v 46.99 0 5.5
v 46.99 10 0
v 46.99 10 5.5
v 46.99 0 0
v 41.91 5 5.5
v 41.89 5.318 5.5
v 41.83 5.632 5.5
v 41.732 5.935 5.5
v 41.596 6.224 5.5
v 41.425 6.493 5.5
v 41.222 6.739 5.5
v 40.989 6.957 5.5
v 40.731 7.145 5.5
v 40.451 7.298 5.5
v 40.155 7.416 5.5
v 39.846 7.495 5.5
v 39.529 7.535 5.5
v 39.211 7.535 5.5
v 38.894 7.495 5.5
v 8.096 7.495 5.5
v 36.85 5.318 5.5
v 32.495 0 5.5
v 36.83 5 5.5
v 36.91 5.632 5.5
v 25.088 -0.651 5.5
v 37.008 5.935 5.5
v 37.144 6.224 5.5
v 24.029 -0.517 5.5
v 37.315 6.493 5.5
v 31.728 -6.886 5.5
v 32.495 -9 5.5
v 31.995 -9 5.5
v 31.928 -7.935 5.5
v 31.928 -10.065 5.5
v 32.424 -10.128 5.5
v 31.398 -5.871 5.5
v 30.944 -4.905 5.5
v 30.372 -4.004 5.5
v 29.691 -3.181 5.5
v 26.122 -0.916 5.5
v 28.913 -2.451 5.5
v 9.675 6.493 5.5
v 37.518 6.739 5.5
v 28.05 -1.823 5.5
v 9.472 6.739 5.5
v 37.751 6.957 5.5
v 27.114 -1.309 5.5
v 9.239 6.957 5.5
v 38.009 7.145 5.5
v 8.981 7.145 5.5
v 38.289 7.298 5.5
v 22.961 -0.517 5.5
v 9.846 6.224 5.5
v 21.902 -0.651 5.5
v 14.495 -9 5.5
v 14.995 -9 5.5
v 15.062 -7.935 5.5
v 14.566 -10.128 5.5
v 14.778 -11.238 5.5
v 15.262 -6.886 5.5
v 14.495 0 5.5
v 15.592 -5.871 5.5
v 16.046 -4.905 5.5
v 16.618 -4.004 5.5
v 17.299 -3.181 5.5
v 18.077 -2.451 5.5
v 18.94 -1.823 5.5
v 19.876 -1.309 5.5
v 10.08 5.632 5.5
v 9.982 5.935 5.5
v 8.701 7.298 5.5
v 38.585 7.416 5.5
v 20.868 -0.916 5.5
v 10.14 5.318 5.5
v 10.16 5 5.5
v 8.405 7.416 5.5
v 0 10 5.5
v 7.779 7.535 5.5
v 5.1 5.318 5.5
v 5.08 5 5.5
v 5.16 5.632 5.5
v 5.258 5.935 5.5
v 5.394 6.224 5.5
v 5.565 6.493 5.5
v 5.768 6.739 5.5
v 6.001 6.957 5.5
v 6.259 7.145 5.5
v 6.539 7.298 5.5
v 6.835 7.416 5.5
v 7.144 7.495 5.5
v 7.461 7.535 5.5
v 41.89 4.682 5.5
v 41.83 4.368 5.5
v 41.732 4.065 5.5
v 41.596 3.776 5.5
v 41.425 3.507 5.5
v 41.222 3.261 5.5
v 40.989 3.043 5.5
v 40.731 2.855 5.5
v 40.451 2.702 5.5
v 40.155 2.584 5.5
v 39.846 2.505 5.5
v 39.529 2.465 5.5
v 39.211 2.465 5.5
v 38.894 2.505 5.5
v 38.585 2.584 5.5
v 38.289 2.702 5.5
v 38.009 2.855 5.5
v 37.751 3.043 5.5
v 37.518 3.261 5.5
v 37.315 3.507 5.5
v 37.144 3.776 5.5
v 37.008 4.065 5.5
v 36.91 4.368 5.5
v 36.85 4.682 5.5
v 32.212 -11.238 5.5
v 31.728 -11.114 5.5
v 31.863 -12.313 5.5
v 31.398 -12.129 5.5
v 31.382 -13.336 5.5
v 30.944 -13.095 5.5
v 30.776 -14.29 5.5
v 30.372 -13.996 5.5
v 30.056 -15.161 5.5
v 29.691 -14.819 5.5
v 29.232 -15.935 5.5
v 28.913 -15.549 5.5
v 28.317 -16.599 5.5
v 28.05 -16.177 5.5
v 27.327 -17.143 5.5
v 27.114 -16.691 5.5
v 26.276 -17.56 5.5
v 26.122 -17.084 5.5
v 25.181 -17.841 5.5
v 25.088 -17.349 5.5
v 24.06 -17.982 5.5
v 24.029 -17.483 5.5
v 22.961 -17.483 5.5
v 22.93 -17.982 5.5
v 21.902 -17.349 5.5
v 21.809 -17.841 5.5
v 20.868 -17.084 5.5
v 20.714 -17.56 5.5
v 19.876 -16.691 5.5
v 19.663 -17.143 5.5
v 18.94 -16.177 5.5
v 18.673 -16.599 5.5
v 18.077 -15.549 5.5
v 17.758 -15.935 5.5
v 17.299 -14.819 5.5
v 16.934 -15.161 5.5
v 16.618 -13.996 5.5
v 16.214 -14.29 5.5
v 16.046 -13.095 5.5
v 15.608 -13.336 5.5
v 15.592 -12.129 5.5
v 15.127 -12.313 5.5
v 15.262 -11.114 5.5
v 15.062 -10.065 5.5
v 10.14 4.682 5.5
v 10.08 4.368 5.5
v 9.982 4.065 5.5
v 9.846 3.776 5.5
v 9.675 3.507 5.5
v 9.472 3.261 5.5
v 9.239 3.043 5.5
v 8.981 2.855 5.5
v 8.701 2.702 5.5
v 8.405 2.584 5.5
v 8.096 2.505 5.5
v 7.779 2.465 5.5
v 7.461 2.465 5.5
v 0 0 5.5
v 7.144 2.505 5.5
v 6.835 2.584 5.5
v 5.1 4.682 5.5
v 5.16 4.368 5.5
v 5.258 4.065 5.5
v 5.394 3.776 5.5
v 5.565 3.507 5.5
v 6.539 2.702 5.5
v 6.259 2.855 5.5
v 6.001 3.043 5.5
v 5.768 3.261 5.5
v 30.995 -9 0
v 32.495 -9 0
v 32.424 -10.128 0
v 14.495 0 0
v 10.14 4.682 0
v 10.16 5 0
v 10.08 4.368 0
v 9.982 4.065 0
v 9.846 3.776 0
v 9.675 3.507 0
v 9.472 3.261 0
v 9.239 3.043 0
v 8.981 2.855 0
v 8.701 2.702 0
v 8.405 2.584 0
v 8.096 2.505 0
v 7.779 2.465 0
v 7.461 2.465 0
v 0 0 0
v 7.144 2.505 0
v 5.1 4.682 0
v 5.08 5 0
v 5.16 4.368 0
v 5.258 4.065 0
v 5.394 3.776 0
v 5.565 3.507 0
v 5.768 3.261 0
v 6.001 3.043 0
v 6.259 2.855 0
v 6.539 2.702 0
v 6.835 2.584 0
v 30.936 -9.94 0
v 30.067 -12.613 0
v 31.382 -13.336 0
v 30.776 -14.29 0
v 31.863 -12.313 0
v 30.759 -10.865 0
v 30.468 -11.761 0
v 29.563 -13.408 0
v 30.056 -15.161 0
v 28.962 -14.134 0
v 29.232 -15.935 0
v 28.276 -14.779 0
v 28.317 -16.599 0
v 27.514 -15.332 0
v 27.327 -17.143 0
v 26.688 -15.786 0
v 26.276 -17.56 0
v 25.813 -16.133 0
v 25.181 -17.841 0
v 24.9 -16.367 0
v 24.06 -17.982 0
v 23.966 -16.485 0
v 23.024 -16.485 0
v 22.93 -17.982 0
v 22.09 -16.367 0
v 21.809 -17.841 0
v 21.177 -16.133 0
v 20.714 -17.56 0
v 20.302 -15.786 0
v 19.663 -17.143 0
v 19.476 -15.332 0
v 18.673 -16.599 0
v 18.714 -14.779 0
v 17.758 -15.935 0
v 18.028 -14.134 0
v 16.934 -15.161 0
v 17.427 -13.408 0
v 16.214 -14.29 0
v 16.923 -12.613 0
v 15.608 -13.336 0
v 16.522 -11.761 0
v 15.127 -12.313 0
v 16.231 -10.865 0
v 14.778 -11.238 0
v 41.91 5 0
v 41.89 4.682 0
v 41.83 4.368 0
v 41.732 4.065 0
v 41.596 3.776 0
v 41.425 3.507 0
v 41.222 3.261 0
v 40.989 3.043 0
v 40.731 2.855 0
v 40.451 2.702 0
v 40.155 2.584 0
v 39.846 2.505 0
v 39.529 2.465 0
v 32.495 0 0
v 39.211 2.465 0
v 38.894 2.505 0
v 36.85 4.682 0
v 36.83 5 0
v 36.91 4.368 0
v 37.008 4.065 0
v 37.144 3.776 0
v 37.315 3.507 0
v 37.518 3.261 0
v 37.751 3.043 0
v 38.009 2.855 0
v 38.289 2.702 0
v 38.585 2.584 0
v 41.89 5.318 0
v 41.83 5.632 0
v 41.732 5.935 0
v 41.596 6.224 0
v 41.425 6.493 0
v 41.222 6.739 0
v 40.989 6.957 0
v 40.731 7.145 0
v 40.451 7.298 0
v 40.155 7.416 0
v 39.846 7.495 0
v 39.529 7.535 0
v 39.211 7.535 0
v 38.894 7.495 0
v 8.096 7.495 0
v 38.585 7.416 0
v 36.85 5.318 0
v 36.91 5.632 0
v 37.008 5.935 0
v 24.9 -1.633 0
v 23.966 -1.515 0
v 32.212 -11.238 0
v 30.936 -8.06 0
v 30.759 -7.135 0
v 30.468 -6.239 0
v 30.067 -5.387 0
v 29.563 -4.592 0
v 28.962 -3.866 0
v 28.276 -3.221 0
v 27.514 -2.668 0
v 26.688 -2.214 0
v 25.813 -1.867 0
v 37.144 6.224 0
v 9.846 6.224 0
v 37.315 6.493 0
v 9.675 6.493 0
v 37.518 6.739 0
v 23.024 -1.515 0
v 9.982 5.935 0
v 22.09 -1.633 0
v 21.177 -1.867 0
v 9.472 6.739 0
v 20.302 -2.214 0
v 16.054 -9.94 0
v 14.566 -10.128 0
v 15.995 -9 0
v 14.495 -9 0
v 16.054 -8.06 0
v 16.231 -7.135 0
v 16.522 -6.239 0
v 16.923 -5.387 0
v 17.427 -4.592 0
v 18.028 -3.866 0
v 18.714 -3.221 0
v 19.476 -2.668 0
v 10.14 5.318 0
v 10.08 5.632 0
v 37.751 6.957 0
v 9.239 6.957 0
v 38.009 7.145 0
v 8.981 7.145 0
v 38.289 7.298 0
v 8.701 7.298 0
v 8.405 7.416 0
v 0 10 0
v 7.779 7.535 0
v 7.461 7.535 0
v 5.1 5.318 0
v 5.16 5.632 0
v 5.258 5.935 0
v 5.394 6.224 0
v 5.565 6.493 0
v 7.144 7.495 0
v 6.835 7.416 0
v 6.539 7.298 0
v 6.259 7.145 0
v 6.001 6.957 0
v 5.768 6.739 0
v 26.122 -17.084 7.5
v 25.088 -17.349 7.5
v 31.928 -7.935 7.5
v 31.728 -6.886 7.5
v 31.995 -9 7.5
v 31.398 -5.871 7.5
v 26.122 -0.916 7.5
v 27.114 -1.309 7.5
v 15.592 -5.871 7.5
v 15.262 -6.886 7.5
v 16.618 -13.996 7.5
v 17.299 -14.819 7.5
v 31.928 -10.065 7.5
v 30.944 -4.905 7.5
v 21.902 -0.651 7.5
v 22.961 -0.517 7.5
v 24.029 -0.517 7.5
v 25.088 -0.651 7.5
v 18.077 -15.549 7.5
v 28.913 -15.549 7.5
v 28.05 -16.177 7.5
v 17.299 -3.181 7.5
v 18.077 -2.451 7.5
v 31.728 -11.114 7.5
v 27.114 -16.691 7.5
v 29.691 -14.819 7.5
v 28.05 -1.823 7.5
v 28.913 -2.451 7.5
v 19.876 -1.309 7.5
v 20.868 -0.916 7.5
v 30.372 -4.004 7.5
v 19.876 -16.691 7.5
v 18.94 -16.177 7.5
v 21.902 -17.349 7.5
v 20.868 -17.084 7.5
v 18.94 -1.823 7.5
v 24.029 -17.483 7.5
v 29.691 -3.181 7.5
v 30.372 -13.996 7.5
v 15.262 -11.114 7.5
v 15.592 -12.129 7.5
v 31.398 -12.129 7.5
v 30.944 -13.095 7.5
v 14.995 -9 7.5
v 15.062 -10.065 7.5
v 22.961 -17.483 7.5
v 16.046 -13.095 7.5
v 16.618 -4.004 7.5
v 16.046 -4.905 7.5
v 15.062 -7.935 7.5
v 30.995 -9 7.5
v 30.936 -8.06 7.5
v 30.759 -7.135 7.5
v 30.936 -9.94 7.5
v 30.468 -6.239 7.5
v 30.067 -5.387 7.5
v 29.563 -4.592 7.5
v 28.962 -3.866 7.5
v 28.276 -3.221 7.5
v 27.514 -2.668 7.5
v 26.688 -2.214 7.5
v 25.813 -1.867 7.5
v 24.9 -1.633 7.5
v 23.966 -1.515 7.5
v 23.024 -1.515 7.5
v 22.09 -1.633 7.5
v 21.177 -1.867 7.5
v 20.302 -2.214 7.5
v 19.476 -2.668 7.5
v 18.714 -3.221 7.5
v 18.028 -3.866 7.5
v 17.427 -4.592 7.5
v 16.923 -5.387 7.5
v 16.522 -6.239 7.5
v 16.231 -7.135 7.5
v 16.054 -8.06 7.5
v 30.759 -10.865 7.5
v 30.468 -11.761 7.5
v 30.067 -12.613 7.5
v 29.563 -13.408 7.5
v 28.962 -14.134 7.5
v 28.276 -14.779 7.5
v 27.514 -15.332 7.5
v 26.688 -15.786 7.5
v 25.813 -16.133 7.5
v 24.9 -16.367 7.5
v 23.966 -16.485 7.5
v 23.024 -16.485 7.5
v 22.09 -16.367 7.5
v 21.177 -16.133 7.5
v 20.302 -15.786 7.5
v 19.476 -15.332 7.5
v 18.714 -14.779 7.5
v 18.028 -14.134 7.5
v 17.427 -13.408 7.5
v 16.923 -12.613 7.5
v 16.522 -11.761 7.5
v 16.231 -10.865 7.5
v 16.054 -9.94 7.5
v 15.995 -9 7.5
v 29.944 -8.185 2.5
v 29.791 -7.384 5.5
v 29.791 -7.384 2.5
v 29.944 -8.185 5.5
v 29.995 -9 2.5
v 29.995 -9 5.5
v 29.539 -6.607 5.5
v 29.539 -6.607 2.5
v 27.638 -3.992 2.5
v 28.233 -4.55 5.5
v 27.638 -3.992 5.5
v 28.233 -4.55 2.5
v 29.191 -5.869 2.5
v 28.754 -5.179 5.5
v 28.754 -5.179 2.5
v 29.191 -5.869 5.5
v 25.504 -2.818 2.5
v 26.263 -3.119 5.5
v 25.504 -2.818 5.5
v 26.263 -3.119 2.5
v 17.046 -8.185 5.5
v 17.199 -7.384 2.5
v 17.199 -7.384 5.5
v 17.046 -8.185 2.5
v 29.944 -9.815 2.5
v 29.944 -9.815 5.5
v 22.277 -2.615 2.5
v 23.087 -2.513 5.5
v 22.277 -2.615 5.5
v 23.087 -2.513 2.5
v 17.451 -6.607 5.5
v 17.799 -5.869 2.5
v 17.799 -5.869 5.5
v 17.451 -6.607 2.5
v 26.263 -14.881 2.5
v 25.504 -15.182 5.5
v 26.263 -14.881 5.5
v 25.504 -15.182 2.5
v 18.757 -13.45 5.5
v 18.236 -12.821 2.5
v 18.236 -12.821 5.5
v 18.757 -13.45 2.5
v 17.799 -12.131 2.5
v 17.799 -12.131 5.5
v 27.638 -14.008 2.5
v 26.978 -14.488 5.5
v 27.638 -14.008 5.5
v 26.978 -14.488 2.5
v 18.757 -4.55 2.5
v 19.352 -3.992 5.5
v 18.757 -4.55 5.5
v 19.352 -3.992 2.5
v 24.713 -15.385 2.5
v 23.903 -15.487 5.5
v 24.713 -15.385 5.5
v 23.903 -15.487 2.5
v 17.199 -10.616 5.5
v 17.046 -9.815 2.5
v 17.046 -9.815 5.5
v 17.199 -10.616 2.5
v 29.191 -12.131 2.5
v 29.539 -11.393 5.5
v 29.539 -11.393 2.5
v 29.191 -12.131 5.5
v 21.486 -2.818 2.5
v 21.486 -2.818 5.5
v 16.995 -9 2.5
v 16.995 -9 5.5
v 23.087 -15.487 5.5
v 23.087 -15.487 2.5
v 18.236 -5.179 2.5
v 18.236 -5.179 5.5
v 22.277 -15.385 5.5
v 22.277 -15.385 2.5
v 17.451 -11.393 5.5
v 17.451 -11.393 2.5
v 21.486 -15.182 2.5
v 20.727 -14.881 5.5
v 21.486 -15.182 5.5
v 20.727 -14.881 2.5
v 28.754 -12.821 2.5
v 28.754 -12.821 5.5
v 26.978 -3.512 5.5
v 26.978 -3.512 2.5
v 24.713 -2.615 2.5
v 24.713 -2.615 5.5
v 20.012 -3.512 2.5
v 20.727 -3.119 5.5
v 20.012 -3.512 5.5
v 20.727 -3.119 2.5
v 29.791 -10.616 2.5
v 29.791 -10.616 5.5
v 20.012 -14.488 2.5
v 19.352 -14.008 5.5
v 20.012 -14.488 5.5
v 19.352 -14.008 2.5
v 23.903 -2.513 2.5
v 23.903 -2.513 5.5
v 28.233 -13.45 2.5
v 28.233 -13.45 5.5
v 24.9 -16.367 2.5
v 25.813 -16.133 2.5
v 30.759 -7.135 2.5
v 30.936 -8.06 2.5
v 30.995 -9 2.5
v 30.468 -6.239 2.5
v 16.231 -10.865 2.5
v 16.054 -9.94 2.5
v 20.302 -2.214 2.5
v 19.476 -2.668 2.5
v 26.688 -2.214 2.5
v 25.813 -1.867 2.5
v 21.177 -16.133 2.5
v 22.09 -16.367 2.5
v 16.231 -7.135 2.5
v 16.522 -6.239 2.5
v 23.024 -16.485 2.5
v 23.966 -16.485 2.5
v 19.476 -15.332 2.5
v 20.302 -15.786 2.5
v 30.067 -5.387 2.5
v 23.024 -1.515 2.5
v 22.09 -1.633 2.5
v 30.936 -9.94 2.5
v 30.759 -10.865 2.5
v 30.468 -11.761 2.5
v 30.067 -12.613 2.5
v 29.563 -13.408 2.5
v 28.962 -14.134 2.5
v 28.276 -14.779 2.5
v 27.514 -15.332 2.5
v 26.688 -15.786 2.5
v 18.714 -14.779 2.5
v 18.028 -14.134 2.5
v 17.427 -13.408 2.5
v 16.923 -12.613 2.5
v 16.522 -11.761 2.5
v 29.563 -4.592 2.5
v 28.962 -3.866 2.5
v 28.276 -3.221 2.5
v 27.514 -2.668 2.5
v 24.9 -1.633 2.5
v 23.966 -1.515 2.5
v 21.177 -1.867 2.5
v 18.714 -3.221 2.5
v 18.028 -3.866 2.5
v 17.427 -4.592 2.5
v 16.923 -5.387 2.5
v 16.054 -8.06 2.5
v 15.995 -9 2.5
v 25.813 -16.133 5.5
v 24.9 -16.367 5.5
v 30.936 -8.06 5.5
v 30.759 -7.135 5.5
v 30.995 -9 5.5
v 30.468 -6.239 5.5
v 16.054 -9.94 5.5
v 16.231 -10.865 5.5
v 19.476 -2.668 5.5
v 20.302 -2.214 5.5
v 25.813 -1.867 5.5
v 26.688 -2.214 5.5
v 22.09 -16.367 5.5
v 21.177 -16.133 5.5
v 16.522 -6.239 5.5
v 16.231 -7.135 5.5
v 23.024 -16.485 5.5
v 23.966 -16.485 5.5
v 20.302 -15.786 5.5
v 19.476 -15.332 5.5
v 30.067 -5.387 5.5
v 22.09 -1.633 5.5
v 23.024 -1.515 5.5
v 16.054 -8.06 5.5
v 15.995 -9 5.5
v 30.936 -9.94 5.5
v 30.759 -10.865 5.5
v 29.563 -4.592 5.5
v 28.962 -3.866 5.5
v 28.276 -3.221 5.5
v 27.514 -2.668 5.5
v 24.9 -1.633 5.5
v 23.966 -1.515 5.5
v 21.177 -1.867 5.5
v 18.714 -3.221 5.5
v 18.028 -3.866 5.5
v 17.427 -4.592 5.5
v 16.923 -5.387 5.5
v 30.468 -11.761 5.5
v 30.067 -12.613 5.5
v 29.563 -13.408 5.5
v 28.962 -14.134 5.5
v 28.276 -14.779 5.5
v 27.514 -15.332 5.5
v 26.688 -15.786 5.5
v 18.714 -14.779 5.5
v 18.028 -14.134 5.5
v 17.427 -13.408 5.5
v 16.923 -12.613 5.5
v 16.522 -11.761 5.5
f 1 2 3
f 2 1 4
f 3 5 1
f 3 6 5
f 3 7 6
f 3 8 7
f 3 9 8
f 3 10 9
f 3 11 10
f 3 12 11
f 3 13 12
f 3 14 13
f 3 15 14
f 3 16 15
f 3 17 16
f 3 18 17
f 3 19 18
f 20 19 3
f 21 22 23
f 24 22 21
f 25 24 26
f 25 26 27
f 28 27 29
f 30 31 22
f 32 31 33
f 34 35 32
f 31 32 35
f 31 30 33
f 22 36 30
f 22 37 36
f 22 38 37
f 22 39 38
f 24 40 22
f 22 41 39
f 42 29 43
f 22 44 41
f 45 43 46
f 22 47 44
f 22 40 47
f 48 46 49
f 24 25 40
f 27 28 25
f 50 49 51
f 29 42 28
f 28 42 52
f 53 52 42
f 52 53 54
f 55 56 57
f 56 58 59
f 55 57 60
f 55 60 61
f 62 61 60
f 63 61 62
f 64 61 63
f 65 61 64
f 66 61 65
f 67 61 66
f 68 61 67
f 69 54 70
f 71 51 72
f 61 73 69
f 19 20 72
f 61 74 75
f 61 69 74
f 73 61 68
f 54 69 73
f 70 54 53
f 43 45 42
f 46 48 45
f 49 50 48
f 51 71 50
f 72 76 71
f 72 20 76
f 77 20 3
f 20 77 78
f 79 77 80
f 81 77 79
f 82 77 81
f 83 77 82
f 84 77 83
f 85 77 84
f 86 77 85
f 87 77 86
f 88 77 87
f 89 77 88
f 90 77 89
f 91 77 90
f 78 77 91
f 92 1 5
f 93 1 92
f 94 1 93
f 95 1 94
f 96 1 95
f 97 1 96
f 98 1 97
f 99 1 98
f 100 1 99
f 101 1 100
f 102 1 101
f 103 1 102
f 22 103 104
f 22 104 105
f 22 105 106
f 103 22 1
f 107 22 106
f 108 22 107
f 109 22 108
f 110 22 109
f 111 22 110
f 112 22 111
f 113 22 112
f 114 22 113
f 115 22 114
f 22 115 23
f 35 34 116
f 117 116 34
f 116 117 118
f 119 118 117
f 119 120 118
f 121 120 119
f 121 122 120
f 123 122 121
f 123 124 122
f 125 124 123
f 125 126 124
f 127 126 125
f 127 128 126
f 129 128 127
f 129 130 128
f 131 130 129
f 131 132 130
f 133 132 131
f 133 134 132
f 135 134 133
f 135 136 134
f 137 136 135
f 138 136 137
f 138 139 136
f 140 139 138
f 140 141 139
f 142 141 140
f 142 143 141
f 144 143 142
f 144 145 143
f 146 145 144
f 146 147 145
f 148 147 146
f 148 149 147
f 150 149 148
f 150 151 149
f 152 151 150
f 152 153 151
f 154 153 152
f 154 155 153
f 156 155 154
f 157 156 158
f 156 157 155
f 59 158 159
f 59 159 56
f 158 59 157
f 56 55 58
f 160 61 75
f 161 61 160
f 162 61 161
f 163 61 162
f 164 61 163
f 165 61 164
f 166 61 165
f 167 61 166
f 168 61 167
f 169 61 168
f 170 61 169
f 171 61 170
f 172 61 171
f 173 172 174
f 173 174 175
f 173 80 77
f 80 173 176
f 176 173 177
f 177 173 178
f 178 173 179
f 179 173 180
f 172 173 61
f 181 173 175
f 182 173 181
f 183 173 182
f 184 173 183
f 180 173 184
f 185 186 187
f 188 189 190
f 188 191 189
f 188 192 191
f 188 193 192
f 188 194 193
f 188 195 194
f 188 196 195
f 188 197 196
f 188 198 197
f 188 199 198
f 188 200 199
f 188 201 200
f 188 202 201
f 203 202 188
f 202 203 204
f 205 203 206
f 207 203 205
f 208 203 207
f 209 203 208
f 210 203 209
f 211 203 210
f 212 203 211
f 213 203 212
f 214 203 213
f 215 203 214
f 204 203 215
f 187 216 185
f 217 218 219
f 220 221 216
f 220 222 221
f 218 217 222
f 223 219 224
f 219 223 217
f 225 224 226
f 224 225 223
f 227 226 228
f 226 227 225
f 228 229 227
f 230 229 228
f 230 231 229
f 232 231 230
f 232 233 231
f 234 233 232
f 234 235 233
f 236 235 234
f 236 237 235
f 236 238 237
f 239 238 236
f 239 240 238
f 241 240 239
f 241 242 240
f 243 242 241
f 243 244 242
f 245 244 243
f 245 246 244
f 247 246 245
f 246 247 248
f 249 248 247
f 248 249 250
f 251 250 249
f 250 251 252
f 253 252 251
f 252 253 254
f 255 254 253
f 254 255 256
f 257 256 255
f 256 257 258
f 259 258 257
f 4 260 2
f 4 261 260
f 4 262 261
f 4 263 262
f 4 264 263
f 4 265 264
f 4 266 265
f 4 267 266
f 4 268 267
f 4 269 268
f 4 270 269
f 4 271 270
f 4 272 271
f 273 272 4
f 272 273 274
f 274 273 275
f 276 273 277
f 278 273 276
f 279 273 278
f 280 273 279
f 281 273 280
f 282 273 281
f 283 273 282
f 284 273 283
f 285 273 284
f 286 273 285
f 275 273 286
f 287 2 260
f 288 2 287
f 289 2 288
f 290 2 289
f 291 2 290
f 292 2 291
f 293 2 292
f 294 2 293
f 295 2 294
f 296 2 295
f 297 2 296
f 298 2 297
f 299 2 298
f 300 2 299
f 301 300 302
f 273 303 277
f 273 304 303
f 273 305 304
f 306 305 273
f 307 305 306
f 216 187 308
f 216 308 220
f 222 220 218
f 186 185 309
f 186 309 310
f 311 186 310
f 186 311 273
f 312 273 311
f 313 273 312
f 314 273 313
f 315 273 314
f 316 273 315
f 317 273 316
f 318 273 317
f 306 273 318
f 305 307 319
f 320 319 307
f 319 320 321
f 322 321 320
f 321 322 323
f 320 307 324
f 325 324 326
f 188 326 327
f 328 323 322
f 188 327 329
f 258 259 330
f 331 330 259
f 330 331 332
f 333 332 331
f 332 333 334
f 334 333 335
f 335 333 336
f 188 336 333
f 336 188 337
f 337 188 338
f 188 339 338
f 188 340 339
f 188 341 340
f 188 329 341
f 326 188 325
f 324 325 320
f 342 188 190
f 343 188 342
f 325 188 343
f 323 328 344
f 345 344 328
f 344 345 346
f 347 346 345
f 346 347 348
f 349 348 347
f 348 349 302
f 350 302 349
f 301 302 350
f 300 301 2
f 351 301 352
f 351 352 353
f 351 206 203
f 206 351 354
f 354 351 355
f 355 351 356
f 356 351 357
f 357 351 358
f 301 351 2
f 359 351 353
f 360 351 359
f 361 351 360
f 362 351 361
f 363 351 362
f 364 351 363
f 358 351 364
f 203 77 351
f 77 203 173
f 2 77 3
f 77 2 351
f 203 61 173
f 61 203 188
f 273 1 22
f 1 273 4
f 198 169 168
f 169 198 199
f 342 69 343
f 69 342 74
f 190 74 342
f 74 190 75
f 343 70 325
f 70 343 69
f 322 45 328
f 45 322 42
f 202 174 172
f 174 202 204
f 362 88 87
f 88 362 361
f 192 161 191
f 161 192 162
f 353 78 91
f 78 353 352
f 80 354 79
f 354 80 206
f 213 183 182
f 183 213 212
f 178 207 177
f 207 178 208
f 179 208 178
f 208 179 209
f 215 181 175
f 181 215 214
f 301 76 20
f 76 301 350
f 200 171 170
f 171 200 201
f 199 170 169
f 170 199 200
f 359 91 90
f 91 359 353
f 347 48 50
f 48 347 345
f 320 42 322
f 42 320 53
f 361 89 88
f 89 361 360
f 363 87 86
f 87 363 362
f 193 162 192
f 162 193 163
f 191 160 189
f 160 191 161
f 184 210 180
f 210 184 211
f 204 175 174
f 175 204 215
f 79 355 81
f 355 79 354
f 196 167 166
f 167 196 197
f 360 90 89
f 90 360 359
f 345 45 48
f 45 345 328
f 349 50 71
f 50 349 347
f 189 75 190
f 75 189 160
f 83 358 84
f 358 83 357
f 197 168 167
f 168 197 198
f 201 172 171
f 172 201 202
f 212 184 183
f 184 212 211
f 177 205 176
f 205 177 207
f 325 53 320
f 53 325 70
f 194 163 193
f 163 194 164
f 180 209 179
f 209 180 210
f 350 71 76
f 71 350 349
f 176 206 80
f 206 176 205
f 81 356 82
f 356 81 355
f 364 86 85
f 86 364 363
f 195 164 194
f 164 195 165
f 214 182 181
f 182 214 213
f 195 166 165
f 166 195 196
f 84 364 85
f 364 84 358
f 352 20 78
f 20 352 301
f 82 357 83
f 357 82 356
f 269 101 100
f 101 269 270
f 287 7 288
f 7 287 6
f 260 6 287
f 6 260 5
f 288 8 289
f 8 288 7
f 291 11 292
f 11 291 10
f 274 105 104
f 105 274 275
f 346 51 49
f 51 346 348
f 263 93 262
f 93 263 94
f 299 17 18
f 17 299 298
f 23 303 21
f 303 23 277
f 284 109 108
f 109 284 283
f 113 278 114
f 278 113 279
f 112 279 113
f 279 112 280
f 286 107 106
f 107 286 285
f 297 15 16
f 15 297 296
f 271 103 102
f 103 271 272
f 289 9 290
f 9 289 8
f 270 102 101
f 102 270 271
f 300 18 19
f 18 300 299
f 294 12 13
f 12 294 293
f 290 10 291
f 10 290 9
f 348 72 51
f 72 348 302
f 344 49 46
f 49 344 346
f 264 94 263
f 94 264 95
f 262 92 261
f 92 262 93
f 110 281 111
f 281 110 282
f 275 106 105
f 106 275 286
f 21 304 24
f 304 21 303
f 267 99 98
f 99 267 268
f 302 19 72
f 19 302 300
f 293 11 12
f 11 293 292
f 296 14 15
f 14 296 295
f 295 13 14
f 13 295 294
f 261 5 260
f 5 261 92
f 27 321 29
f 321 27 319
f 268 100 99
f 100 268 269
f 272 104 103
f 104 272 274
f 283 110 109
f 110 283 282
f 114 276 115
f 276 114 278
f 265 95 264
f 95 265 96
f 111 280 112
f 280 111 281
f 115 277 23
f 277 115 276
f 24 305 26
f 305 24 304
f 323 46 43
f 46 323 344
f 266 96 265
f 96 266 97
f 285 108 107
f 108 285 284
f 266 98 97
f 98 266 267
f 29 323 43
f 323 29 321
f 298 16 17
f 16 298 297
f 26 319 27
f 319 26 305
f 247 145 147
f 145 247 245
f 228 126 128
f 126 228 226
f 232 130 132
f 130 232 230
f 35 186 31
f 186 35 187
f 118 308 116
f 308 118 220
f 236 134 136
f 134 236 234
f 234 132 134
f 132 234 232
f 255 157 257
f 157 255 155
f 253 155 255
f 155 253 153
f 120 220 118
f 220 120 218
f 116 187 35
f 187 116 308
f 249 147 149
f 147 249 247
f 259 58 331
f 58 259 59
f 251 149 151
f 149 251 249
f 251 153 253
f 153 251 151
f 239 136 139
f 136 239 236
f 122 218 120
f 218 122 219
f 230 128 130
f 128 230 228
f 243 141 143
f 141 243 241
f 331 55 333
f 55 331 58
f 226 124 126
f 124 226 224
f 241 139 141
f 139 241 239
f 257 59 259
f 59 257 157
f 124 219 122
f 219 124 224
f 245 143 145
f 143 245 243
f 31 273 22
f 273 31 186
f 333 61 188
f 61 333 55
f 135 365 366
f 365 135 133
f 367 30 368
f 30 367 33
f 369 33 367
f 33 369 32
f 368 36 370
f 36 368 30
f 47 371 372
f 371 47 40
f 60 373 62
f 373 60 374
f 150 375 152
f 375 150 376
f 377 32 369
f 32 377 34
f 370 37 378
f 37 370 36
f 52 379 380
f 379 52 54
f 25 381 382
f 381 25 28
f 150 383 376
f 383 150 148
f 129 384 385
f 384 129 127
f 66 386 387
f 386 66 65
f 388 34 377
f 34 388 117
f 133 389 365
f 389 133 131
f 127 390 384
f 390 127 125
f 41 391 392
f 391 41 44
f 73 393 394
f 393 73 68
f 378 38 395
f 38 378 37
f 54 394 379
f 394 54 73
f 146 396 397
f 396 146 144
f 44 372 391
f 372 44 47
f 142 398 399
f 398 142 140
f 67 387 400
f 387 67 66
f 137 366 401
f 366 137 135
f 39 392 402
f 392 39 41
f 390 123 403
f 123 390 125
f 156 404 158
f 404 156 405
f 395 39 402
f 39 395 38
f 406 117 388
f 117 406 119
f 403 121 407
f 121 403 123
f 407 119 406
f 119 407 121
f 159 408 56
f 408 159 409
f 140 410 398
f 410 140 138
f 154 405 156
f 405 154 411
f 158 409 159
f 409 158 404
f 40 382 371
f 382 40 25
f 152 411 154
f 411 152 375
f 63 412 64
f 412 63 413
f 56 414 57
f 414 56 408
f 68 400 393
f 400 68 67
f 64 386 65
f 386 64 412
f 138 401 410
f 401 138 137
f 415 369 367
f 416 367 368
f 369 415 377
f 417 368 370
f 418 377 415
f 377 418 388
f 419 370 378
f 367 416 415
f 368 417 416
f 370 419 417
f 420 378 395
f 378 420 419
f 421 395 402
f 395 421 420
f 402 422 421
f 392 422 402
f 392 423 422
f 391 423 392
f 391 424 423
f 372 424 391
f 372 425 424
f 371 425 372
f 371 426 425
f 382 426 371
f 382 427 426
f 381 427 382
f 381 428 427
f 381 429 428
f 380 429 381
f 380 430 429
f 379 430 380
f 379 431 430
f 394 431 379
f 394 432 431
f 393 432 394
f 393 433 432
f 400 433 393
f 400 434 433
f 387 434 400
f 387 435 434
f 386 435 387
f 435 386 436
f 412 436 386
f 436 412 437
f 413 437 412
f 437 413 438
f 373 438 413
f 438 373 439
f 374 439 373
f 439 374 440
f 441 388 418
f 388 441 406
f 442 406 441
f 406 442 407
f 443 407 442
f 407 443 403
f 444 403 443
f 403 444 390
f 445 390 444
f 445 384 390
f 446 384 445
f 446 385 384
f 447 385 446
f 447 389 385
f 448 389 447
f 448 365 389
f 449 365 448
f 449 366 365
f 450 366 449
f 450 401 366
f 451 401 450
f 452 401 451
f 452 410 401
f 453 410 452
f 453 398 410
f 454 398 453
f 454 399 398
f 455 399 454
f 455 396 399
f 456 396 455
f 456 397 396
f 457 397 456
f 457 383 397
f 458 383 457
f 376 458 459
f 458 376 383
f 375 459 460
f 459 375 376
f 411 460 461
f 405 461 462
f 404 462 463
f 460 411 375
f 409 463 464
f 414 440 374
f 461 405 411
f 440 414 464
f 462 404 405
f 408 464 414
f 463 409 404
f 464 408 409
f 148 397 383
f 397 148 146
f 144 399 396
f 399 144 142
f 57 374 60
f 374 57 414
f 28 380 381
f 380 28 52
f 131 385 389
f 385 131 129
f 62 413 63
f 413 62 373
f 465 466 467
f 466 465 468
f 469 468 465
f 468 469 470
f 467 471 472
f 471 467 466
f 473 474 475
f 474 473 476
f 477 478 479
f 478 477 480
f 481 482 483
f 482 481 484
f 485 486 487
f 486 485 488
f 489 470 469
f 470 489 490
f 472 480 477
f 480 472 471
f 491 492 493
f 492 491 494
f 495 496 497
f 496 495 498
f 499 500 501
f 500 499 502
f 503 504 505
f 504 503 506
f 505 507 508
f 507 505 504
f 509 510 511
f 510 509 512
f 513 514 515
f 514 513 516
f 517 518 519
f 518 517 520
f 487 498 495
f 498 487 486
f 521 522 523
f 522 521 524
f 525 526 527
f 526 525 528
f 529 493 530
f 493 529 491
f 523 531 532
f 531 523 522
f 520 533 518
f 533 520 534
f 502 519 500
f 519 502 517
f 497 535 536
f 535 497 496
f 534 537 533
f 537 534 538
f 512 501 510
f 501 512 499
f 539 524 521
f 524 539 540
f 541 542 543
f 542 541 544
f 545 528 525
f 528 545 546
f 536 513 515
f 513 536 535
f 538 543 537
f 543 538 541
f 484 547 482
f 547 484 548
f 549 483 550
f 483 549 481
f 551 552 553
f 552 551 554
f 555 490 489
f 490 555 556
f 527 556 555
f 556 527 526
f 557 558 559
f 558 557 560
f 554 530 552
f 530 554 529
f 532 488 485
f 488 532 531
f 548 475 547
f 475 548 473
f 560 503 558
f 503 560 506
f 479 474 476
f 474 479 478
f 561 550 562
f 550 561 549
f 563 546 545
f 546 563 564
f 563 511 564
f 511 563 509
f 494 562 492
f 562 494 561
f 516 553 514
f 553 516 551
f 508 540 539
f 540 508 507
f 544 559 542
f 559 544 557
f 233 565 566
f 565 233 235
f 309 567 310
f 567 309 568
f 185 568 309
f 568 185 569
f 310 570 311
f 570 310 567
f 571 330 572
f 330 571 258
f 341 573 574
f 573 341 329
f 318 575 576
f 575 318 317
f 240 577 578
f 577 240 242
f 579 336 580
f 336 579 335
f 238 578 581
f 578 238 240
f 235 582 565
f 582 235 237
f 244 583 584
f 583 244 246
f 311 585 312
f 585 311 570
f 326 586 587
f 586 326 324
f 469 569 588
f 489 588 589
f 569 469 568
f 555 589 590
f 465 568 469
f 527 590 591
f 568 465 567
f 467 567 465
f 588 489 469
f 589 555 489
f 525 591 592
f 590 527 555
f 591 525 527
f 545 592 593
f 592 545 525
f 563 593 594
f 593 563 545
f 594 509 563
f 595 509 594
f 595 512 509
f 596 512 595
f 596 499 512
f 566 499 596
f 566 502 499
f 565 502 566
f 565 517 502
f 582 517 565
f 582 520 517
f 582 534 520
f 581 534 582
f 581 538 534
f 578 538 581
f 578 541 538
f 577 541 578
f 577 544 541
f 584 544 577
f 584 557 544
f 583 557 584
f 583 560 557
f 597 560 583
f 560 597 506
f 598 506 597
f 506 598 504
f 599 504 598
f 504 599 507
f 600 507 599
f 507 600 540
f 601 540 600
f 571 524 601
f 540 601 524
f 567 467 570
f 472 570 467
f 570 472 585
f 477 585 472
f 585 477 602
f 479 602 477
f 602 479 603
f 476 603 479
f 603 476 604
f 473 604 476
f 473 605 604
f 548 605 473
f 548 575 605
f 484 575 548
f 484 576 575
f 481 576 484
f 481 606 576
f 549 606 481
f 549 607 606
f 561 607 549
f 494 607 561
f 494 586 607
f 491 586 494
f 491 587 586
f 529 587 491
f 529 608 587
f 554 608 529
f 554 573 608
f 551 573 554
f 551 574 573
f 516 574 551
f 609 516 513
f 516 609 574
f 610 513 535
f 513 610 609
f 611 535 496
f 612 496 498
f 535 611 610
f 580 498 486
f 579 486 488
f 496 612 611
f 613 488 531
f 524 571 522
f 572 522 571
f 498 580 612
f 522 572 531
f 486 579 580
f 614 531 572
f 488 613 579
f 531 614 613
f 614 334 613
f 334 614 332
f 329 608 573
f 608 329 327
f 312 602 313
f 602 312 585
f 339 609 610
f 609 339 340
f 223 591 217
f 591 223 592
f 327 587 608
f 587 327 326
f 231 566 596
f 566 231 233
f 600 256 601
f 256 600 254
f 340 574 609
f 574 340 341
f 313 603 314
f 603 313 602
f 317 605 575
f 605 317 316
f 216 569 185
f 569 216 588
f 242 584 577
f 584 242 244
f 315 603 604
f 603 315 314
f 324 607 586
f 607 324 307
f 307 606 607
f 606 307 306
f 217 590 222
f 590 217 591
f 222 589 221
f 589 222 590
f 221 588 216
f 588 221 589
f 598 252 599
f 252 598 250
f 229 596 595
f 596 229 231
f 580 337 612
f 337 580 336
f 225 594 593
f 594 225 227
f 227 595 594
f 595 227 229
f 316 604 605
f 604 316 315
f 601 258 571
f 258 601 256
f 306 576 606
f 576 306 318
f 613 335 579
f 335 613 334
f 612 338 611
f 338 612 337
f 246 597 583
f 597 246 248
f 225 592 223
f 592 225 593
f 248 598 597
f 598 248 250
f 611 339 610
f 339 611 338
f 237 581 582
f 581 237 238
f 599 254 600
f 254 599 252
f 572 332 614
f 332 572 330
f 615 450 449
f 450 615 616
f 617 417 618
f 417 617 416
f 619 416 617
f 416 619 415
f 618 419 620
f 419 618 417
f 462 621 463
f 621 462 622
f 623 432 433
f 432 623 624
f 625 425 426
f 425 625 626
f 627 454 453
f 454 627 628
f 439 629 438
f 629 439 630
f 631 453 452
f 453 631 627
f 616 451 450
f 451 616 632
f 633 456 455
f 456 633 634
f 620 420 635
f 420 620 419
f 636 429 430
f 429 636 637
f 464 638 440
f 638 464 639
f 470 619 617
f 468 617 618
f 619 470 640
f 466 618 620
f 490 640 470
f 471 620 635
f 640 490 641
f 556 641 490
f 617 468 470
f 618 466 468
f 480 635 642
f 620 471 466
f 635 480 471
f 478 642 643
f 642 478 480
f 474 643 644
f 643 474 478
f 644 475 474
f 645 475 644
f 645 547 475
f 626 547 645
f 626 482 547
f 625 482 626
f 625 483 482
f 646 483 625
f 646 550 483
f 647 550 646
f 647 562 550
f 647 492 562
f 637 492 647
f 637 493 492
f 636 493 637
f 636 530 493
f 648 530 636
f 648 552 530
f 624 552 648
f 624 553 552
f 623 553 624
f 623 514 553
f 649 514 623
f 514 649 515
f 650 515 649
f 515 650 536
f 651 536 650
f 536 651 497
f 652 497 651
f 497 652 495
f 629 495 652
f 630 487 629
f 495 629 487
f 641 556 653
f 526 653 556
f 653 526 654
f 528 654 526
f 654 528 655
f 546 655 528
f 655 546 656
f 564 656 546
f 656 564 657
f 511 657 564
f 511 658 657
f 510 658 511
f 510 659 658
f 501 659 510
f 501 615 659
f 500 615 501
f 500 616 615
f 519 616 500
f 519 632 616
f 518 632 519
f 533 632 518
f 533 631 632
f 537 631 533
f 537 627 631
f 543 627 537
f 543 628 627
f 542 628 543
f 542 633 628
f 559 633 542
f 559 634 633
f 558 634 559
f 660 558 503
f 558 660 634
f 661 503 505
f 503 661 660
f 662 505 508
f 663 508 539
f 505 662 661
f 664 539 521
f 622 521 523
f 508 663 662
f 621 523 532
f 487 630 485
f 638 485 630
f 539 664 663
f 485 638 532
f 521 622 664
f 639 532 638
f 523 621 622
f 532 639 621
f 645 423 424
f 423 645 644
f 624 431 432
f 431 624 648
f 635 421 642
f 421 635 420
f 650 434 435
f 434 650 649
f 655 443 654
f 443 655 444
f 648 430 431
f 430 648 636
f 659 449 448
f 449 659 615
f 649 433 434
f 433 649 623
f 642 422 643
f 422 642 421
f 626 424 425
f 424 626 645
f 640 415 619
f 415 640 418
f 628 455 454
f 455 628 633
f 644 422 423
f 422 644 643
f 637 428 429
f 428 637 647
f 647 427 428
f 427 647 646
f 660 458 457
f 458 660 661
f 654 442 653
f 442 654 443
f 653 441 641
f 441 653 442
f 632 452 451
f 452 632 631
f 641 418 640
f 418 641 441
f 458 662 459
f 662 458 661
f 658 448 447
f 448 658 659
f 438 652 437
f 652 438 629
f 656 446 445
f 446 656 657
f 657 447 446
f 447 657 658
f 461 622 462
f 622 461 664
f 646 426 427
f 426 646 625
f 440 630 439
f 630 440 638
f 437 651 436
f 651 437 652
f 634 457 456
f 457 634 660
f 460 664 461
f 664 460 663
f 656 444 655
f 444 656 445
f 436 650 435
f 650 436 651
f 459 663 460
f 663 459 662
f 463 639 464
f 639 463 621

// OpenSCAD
$fn=50;

module lampmount(width, thick) {
  hole=13;
  baset=2.5;
  clear=3;
//  thick=baset+clear;
  difference(){
    union(){
      translate([0,0,0]) cylinder(r=width/2,h=thick);
      translate([-width/2,0,0]) cube([width,width/2,thick]);
      translate([0,0,baset+clear]) cylinder(r=hole/2+2,h=2);
    }
    translate([0,0,-1]) cylinder(r=hole/2,h=thick+2);
    translate([0,0,-clear]) cylinder(r=hole/2+1,h=thick);
    translate([0,0,baset+clear]) cylinder(r=hole/2+1,h=thick);
  }
}

module mount(d,screw, width, thick) {

  difference(){
    cube([d+screw*3,width,thick]);
    translate([screw*1.5,width/2,-1])cylinder(r=screw/2,h=thick+2);
    translate([d+screw*1.5,width/2,-1])cylinder(r=screw/2,h=thick+2);
  }
}
spacing = 1.25*25.4;
screw=0.2*25.4;
mount(spacing, screw, 10, 5.5);
translate([(spacing+screw*3)/2,-9,0]) lampmount(18,5.5);
